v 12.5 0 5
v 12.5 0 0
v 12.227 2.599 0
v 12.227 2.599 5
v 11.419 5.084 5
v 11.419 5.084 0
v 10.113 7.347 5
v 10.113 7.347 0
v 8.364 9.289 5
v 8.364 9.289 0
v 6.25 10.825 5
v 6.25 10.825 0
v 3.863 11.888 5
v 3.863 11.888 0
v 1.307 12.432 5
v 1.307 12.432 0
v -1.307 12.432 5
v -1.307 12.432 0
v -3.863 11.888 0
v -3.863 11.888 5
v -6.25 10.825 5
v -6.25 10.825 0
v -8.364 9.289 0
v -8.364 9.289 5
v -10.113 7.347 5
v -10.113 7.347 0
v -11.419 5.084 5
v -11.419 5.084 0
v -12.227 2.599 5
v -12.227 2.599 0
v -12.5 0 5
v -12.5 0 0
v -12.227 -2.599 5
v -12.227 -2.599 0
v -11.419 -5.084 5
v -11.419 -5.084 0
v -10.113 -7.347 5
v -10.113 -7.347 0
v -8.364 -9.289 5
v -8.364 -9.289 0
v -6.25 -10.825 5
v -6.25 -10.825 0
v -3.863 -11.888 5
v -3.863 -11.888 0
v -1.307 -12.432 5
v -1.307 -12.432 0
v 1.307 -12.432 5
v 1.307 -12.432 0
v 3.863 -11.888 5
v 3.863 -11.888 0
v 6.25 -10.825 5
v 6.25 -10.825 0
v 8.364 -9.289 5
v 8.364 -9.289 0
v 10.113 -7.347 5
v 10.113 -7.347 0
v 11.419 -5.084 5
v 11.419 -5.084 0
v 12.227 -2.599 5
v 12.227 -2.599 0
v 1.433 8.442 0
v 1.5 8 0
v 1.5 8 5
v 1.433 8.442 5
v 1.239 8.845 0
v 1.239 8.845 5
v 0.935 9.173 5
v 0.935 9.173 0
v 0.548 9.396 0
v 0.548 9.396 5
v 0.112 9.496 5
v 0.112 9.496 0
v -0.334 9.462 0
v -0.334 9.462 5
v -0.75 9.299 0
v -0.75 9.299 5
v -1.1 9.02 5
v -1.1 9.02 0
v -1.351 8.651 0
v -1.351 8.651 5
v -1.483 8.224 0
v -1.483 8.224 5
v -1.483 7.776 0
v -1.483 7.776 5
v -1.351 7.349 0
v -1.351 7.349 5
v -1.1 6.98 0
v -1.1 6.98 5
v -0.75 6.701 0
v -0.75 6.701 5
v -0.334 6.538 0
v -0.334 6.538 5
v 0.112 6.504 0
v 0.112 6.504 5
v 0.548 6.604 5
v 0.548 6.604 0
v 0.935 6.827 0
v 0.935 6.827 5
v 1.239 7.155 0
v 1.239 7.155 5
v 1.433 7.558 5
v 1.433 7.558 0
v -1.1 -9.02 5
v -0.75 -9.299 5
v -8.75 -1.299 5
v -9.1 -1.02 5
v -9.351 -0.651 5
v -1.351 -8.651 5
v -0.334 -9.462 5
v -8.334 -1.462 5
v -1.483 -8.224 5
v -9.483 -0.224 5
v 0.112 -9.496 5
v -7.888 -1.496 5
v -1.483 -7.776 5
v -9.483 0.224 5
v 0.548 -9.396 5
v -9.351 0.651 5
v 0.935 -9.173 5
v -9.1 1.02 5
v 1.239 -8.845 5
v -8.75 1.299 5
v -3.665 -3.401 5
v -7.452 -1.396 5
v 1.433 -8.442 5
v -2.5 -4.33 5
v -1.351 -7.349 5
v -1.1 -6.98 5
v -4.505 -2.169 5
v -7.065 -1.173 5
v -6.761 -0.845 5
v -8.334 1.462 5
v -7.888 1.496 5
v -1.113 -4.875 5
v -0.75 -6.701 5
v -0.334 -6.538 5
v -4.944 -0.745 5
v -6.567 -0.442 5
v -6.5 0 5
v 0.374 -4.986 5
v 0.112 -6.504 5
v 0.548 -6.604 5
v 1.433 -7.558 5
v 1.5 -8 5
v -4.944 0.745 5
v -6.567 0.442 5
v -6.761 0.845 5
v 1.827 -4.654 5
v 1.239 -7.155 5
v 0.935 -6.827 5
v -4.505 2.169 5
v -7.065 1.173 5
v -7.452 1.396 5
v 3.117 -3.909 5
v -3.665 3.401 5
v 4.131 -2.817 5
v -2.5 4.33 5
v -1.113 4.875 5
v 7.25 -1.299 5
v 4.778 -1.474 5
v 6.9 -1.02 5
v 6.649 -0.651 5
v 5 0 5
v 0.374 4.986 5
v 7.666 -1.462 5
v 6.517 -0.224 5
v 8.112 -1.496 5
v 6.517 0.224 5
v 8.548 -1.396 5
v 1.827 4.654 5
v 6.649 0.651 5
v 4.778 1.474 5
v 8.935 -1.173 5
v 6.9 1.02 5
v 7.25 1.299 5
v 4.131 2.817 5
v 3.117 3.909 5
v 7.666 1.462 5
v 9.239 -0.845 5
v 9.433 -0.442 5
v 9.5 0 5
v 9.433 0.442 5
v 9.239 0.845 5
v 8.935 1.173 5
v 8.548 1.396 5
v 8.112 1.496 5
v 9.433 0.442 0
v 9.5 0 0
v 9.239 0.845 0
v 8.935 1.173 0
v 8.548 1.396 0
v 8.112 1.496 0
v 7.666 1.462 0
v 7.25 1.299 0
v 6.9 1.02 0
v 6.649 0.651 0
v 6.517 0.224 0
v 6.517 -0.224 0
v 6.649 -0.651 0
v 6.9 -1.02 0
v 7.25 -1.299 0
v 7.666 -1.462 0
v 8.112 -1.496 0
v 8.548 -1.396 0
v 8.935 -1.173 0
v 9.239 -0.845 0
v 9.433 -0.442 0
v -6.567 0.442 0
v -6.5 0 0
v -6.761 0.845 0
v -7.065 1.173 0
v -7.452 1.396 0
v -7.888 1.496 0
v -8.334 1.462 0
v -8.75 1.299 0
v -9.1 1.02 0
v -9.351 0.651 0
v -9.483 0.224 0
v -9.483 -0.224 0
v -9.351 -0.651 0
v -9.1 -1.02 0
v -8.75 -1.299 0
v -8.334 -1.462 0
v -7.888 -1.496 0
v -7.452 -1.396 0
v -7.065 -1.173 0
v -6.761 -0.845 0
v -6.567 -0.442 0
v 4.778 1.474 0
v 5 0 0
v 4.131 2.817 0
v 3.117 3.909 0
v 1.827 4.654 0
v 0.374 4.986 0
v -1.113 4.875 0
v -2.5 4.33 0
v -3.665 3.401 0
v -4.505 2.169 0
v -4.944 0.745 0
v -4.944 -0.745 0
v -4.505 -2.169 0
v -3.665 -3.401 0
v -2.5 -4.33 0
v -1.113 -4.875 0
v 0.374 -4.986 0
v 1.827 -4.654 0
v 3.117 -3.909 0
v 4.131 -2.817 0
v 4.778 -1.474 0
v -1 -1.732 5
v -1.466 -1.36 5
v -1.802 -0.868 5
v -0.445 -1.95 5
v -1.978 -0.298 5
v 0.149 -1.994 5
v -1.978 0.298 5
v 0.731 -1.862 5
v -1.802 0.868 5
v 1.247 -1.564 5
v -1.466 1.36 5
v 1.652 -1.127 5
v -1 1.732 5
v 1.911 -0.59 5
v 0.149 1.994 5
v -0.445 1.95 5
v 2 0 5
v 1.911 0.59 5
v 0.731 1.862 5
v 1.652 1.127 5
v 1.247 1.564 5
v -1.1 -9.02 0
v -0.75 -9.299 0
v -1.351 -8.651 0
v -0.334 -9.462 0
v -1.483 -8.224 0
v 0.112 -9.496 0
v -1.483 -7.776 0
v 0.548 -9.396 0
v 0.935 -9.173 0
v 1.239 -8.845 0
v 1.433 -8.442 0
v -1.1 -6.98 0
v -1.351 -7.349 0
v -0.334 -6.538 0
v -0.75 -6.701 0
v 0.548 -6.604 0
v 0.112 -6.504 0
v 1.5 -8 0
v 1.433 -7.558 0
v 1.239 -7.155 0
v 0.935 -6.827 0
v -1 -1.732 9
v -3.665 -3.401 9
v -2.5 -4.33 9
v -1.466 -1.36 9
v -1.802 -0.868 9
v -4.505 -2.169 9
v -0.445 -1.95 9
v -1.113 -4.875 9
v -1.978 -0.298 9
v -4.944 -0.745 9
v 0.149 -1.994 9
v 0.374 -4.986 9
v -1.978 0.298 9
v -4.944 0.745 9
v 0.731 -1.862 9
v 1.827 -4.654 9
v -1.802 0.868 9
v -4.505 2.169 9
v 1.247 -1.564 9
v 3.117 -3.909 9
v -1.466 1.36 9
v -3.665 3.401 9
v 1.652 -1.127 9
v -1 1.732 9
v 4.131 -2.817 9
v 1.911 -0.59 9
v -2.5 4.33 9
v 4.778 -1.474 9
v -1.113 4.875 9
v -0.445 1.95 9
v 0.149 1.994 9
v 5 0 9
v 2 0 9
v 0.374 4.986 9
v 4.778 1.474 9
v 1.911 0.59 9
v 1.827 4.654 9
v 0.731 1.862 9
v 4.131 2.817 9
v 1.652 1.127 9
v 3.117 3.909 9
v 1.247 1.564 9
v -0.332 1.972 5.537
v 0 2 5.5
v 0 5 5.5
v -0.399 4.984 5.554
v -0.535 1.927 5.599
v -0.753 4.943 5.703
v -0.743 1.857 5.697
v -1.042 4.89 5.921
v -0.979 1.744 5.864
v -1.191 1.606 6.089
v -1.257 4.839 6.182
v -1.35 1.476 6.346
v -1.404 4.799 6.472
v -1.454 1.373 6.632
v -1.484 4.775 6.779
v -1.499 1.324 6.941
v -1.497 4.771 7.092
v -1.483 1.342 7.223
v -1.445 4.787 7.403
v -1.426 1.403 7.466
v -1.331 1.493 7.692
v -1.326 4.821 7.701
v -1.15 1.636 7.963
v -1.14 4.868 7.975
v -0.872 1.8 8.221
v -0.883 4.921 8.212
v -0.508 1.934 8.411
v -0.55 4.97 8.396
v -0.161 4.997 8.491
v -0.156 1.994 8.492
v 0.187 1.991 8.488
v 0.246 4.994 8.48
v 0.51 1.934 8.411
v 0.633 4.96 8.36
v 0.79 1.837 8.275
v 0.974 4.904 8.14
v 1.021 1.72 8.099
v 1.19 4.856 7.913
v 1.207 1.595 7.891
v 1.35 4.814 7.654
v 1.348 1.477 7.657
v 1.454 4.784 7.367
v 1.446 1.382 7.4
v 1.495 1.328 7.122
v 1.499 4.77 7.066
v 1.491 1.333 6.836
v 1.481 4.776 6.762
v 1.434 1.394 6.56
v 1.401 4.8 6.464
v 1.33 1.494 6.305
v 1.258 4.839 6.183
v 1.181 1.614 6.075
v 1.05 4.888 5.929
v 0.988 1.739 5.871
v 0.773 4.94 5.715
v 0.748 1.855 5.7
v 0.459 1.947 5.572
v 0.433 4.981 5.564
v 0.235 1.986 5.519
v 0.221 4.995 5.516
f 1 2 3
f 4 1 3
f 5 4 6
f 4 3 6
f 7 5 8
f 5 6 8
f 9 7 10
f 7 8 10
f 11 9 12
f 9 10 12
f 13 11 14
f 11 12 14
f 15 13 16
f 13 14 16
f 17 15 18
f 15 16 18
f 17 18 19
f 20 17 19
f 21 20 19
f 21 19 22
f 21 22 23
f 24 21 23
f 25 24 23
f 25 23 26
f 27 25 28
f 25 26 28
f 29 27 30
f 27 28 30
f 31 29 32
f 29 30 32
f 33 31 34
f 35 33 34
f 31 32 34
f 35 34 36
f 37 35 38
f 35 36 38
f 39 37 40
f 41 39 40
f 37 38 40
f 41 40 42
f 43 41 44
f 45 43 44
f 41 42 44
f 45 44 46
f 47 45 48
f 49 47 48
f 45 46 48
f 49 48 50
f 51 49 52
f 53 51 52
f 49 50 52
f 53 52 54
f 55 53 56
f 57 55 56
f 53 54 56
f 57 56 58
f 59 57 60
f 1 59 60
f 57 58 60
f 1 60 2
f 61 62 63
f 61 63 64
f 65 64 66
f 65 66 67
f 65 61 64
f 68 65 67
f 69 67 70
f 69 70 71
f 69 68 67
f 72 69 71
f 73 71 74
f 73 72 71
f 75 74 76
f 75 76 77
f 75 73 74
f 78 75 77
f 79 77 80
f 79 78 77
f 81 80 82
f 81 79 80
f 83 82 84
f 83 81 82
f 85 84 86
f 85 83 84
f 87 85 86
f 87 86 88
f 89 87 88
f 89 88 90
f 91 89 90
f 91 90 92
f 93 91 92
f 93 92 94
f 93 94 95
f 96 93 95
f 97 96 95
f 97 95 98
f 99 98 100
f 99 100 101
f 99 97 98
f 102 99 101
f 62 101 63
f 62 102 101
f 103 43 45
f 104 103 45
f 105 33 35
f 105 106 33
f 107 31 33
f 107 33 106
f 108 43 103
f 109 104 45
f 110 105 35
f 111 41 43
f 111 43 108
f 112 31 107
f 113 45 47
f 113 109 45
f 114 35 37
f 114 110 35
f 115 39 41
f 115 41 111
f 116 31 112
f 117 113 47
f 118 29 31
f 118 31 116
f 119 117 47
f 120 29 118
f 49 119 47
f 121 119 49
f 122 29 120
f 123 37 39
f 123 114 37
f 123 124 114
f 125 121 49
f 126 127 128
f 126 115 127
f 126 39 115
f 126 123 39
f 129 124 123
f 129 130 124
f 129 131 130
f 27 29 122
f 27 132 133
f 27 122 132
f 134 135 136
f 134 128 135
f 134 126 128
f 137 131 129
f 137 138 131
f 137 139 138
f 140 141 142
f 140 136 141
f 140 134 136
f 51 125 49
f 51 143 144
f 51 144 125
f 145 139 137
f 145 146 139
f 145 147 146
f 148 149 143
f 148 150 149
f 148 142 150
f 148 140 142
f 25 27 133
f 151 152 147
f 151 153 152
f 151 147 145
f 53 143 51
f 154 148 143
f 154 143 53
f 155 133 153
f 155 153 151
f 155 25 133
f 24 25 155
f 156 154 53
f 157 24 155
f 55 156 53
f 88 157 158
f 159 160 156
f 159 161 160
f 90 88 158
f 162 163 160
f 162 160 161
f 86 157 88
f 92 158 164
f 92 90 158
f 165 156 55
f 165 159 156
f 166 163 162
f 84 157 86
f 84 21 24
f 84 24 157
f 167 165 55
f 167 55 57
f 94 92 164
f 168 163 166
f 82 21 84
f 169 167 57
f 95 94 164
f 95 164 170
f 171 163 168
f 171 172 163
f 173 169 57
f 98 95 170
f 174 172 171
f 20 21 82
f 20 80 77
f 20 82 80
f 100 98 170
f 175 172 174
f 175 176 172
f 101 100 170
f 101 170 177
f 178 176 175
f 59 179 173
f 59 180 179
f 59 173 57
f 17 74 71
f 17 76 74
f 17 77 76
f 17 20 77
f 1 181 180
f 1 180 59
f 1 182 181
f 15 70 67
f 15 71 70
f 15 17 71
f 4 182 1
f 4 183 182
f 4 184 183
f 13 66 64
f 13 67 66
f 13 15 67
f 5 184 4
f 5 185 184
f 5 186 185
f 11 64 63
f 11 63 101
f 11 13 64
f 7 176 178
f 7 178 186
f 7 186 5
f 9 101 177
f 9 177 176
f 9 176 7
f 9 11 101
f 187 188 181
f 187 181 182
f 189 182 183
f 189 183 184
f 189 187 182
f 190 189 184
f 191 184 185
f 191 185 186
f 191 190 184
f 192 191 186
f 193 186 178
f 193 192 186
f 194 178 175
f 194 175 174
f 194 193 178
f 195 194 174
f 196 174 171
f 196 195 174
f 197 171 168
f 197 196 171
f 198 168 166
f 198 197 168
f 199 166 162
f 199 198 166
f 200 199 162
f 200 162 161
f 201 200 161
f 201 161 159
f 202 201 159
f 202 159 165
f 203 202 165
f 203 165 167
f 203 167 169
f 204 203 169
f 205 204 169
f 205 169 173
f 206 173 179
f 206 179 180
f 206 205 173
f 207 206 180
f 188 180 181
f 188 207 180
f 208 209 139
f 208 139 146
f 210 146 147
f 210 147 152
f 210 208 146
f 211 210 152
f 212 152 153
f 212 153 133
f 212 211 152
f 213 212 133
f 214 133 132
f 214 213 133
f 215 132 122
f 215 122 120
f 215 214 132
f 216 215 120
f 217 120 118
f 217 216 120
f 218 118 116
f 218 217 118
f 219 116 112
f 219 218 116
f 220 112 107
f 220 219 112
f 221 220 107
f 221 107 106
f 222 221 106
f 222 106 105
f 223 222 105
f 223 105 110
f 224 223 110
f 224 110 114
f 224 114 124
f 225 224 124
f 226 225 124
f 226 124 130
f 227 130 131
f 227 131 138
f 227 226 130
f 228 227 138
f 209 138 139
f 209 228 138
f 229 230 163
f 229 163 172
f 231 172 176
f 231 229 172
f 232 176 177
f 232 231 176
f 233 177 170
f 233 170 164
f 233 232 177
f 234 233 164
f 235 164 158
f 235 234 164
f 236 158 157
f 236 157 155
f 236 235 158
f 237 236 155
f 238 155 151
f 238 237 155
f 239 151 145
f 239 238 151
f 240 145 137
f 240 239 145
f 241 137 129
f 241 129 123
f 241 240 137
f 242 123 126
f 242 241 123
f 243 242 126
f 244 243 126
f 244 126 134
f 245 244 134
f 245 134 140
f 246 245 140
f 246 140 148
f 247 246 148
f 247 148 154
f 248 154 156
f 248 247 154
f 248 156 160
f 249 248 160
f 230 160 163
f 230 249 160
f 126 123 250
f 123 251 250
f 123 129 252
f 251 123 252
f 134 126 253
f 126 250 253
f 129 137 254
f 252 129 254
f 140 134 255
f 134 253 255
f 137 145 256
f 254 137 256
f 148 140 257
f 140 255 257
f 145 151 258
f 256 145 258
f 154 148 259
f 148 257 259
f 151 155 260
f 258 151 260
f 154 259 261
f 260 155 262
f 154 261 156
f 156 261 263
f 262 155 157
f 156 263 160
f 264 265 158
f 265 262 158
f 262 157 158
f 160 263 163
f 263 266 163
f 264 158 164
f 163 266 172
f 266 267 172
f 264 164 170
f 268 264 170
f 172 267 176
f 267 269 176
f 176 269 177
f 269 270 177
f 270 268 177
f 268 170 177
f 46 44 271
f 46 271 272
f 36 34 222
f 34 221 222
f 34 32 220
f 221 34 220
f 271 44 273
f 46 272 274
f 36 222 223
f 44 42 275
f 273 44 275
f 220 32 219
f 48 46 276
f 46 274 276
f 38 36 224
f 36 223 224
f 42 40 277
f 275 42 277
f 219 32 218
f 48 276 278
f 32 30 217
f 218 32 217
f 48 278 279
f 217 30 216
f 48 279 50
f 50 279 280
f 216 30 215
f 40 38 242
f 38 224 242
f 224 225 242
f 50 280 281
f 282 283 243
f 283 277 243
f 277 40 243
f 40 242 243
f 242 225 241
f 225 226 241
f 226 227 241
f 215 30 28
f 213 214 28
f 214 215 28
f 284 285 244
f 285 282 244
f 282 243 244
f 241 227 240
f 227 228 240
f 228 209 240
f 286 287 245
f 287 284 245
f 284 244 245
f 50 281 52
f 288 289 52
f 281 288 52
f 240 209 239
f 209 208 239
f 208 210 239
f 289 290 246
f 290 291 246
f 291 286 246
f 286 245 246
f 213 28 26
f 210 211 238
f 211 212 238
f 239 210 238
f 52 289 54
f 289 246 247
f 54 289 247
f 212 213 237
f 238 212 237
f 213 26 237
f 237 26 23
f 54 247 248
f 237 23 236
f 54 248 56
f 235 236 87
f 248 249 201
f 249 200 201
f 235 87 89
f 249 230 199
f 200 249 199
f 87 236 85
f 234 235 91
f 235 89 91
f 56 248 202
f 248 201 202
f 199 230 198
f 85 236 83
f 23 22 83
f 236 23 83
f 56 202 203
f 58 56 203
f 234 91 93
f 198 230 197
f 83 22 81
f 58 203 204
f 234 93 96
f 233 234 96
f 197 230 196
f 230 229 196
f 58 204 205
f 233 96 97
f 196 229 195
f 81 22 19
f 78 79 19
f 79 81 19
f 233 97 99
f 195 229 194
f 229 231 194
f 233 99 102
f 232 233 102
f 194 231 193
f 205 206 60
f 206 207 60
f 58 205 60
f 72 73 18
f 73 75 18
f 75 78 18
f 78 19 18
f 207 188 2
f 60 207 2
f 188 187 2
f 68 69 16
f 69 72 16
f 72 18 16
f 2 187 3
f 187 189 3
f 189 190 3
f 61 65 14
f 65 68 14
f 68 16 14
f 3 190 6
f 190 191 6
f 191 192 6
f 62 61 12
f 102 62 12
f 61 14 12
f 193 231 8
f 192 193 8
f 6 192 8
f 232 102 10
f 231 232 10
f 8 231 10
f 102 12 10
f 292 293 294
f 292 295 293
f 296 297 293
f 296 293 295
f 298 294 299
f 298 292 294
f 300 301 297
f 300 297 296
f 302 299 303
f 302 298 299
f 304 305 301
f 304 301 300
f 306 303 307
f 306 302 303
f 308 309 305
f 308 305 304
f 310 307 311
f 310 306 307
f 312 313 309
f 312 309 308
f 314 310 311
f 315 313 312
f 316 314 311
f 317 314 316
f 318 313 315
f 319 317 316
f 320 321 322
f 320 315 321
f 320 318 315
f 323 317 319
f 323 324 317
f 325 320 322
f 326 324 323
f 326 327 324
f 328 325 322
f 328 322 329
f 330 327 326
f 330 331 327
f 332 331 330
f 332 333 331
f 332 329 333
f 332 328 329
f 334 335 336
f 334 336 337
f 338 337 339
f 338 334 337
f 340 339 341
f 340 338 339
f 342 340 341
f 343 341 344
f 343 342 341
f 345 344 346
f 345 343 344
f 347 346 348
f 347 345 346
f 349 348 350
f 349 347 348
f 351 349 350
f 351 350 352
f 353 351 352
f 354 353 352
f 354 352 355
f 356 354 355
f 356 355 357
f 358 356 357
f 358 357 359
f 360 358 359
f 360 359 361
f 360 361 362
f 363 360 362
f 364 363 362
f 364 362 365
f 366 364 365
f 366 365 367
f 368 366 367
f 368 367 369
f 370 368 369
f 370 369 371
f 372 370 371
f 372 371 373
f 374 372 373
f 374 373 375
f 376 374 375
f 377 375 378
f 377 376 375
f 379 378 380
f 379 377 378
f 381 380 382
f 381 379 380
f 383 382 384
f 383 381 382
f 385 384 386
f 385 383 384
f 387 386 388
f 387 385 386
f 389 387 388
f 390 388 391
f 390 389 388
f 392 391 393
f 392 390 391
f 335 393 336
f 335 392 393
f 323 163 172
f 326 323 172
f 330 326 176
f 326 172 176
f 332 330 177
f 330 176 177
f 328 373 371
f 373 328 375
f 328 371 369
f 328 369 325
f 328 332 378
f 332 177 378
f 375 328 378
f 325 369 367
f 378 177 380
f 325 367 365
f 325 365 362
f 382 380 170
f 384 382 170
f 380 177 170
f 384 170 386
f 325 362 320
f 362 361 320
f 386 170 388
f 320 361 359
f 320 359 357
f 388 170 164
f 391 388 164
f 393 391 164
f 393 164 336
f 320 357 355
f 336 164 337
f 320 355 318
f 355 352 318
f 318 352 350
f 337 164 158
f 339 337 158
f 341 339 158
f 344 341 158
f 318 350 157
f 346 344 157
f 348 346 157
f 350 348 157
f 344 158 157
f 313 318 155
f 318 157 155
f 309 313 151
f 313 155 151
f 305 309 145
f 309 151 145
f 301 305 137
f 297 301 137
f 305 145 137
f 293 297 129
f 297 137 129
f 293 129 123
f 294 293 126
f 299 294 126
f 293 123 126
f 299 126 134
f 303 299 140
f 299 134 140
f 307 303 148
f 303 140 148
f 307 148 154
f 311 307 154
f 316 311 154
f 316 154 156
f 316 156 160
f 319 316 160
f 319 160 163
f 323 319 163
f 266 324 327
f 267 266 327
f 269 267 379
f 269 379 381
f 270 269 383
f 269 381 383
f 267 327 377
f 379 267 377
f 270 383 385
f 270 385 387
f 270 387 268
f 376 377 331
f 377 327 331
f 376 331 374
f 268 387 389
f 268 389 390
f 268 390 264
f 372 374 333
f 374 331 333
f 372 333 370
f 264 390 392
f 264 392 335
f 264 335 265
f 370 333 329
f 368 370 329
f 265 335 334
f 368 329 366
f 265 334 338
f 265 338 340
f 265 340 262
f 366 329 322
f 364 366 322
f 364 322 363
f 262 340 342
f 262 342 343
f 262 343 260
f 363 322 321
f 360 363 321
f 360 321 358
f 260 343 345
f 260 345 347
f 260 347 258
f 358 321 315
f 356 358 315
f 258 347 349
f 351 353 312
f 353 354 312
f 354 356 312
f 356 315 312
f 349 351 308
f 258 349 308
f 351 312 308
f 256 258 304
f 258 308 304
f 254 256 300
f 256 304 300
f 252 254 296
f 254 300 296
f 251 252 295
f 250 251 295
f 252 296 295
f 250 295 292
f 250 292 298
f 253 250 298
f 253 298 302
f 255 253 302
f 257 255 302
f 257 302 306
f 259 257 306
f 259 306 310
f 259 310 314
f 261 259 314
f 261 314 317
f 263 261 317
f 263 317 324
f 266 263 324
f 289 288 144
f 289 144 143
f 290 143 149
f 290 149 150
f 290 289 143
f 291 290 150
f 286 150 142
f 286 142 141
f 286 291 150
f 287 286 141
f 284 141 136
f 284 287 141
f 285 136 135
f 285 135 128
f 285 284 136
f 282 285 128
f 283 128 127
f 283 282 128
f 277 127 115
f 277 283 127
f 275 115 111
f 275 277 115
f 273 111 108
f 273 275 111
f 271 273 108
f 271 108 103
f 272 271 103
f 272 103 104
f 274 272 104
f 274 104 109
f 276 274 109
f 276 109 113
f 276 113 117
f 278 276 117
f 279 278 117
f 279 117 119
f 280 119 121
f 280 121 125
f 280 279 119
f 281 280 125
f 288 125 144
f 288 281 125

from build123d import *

# Parameters (mm, degrees)
ESQUISSE1_R             = 12.5
ESQUISSE1_R_2           = 5
ESQUISSE1_R_3           = 1.5
BOSS_EXTRU_1_DEPTH      = 5
ESQUISSE2_R             = 5
BOSS_EXTRU_2_DEPTH      = 4
ESQUISSE4_R             = 2
ENL_V_MAT_EXTRU_1_DEPTH = 20.836834425
ESQUISSE3_R             = 1.5
ENL_V_MAT_EXTRU_2_DEPTH = 20.836834425


with BuildPart() as part:
    # Esquisse1 → Boss.-Extru.1 (new body)
    with BuildSketch(Plane.XY):
        Circle(ESQUISSE1_R)
        Circle(ESQUISSE1_R_2, mode=Mode.SUBTRACT)
        with Locations((0, 8)):
            Circle(ESQUISSE1_R_3, mode=Mode.SUBTRACT)
        with Locations((8, 0)):
            Circle(ESQUISSE1_R_3, mode=Mode.SUBTRACT)
        with Locations((0, -8)):
            Circle(ESQUISSE1_R_3, mode=Mode.SUBTRACT)
        with Locations((-8, 0)):
            Circle(ESQUISSE1_R_3, mode=Mode.SUBTRACT)
    extrude(amount=BOSS_EXTRU_1_DEPTH)


with BuildPart() as body_2:
    # Esquisse2 → Boss.-Extru.2 (new body)
    with BuildSketch(Plane.XY.offset(5)):
        Circle(ESQUISSE2_R)
    extrude(amount=BOSS_EXTRU_2_DEPTH)

    # Esquisse4 → Enlèv. mat.-Extru.1 (cut, through all)
    with BuildSketch(Plane.XY.offset(9)):
        Circle(ESQUISSE4_R)
    extrude(amount=-ENL_V_MAT_EXTRU_1_DEPTH, mode=Mode.SUBTRACT)

    # Esquisse3 → Enlèv. mat.-Extru.2 (cut, through all)
    with BuildSketch(Plane(origin=(0, 0, 0), x_dir=(1, 0, 0), z_dir=(0, 1, 0))):
        with Locations(Location((0, -7, 0), (0, 0, 90))):
            Circle(ESQUISSE3_R)
    extrude(amount=ENL_V_MAT_EXTRU_2_DEPTH, mode=Mode.SUBTRACT)


solid = Compound([part.part, body_2.part])
